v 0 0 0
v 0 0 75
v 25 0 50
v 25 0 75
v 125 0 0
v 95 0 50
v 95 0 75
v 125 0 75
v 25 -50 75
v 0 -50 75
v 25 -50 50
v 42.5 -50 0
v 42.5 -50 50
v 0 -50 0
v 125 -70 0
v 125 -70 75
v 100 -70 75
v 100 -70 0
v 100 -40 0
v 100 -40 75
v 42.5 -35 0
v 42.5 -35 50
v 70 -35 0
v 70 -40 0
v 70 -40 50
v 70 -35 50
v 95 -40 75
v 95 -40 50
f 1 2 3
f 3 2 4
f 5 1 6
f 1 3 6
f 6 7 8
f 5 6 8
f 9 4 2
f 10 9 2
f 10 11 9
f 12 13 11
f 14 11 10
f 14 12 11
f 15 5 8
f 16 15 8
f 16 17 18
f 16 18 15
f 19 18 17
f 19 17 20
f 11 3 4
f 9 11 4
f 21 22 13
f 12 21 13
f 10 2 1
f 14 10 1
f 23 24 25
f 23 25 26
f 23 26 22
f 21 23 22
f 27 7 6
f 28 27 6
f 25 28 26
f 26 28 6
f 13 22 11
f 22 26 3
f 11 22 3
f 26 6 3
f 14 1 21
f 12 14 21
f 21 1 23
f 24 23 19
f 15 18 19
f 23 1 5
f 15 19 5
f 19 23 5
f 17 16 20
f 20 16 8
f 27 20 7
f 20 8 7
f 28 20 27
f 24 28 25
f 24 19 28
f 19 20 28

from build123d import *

# Parameters (mm, degrees)
F1_DEPTH = 70
F3_DEPTH = 75.001


with BuildPart() as f1:
    # F0 (on Front) → F1 (new body)
    with BuildSketch(Plane.XZ):
        Polygon((0, 75), (0, 0), (125, 0), (125, 75), (95, 75), (95, 50), (25, 50), (25, 75), align=None)
    extrude(amount=F1_DEPTH)

    # F2 (on Top) → F3 (cut, through all)
    with BuildSketch(Plane.XY):
        Polygon((0, -70), (100, -70), (100, -40), (70, -40), (70, -35), (42.5, -35), (42.5, -50), (0, -50), align=None)
    extrude(amount=F3_DEPTH, mode=Mode.SUBTRACT)


solid = f1.part
